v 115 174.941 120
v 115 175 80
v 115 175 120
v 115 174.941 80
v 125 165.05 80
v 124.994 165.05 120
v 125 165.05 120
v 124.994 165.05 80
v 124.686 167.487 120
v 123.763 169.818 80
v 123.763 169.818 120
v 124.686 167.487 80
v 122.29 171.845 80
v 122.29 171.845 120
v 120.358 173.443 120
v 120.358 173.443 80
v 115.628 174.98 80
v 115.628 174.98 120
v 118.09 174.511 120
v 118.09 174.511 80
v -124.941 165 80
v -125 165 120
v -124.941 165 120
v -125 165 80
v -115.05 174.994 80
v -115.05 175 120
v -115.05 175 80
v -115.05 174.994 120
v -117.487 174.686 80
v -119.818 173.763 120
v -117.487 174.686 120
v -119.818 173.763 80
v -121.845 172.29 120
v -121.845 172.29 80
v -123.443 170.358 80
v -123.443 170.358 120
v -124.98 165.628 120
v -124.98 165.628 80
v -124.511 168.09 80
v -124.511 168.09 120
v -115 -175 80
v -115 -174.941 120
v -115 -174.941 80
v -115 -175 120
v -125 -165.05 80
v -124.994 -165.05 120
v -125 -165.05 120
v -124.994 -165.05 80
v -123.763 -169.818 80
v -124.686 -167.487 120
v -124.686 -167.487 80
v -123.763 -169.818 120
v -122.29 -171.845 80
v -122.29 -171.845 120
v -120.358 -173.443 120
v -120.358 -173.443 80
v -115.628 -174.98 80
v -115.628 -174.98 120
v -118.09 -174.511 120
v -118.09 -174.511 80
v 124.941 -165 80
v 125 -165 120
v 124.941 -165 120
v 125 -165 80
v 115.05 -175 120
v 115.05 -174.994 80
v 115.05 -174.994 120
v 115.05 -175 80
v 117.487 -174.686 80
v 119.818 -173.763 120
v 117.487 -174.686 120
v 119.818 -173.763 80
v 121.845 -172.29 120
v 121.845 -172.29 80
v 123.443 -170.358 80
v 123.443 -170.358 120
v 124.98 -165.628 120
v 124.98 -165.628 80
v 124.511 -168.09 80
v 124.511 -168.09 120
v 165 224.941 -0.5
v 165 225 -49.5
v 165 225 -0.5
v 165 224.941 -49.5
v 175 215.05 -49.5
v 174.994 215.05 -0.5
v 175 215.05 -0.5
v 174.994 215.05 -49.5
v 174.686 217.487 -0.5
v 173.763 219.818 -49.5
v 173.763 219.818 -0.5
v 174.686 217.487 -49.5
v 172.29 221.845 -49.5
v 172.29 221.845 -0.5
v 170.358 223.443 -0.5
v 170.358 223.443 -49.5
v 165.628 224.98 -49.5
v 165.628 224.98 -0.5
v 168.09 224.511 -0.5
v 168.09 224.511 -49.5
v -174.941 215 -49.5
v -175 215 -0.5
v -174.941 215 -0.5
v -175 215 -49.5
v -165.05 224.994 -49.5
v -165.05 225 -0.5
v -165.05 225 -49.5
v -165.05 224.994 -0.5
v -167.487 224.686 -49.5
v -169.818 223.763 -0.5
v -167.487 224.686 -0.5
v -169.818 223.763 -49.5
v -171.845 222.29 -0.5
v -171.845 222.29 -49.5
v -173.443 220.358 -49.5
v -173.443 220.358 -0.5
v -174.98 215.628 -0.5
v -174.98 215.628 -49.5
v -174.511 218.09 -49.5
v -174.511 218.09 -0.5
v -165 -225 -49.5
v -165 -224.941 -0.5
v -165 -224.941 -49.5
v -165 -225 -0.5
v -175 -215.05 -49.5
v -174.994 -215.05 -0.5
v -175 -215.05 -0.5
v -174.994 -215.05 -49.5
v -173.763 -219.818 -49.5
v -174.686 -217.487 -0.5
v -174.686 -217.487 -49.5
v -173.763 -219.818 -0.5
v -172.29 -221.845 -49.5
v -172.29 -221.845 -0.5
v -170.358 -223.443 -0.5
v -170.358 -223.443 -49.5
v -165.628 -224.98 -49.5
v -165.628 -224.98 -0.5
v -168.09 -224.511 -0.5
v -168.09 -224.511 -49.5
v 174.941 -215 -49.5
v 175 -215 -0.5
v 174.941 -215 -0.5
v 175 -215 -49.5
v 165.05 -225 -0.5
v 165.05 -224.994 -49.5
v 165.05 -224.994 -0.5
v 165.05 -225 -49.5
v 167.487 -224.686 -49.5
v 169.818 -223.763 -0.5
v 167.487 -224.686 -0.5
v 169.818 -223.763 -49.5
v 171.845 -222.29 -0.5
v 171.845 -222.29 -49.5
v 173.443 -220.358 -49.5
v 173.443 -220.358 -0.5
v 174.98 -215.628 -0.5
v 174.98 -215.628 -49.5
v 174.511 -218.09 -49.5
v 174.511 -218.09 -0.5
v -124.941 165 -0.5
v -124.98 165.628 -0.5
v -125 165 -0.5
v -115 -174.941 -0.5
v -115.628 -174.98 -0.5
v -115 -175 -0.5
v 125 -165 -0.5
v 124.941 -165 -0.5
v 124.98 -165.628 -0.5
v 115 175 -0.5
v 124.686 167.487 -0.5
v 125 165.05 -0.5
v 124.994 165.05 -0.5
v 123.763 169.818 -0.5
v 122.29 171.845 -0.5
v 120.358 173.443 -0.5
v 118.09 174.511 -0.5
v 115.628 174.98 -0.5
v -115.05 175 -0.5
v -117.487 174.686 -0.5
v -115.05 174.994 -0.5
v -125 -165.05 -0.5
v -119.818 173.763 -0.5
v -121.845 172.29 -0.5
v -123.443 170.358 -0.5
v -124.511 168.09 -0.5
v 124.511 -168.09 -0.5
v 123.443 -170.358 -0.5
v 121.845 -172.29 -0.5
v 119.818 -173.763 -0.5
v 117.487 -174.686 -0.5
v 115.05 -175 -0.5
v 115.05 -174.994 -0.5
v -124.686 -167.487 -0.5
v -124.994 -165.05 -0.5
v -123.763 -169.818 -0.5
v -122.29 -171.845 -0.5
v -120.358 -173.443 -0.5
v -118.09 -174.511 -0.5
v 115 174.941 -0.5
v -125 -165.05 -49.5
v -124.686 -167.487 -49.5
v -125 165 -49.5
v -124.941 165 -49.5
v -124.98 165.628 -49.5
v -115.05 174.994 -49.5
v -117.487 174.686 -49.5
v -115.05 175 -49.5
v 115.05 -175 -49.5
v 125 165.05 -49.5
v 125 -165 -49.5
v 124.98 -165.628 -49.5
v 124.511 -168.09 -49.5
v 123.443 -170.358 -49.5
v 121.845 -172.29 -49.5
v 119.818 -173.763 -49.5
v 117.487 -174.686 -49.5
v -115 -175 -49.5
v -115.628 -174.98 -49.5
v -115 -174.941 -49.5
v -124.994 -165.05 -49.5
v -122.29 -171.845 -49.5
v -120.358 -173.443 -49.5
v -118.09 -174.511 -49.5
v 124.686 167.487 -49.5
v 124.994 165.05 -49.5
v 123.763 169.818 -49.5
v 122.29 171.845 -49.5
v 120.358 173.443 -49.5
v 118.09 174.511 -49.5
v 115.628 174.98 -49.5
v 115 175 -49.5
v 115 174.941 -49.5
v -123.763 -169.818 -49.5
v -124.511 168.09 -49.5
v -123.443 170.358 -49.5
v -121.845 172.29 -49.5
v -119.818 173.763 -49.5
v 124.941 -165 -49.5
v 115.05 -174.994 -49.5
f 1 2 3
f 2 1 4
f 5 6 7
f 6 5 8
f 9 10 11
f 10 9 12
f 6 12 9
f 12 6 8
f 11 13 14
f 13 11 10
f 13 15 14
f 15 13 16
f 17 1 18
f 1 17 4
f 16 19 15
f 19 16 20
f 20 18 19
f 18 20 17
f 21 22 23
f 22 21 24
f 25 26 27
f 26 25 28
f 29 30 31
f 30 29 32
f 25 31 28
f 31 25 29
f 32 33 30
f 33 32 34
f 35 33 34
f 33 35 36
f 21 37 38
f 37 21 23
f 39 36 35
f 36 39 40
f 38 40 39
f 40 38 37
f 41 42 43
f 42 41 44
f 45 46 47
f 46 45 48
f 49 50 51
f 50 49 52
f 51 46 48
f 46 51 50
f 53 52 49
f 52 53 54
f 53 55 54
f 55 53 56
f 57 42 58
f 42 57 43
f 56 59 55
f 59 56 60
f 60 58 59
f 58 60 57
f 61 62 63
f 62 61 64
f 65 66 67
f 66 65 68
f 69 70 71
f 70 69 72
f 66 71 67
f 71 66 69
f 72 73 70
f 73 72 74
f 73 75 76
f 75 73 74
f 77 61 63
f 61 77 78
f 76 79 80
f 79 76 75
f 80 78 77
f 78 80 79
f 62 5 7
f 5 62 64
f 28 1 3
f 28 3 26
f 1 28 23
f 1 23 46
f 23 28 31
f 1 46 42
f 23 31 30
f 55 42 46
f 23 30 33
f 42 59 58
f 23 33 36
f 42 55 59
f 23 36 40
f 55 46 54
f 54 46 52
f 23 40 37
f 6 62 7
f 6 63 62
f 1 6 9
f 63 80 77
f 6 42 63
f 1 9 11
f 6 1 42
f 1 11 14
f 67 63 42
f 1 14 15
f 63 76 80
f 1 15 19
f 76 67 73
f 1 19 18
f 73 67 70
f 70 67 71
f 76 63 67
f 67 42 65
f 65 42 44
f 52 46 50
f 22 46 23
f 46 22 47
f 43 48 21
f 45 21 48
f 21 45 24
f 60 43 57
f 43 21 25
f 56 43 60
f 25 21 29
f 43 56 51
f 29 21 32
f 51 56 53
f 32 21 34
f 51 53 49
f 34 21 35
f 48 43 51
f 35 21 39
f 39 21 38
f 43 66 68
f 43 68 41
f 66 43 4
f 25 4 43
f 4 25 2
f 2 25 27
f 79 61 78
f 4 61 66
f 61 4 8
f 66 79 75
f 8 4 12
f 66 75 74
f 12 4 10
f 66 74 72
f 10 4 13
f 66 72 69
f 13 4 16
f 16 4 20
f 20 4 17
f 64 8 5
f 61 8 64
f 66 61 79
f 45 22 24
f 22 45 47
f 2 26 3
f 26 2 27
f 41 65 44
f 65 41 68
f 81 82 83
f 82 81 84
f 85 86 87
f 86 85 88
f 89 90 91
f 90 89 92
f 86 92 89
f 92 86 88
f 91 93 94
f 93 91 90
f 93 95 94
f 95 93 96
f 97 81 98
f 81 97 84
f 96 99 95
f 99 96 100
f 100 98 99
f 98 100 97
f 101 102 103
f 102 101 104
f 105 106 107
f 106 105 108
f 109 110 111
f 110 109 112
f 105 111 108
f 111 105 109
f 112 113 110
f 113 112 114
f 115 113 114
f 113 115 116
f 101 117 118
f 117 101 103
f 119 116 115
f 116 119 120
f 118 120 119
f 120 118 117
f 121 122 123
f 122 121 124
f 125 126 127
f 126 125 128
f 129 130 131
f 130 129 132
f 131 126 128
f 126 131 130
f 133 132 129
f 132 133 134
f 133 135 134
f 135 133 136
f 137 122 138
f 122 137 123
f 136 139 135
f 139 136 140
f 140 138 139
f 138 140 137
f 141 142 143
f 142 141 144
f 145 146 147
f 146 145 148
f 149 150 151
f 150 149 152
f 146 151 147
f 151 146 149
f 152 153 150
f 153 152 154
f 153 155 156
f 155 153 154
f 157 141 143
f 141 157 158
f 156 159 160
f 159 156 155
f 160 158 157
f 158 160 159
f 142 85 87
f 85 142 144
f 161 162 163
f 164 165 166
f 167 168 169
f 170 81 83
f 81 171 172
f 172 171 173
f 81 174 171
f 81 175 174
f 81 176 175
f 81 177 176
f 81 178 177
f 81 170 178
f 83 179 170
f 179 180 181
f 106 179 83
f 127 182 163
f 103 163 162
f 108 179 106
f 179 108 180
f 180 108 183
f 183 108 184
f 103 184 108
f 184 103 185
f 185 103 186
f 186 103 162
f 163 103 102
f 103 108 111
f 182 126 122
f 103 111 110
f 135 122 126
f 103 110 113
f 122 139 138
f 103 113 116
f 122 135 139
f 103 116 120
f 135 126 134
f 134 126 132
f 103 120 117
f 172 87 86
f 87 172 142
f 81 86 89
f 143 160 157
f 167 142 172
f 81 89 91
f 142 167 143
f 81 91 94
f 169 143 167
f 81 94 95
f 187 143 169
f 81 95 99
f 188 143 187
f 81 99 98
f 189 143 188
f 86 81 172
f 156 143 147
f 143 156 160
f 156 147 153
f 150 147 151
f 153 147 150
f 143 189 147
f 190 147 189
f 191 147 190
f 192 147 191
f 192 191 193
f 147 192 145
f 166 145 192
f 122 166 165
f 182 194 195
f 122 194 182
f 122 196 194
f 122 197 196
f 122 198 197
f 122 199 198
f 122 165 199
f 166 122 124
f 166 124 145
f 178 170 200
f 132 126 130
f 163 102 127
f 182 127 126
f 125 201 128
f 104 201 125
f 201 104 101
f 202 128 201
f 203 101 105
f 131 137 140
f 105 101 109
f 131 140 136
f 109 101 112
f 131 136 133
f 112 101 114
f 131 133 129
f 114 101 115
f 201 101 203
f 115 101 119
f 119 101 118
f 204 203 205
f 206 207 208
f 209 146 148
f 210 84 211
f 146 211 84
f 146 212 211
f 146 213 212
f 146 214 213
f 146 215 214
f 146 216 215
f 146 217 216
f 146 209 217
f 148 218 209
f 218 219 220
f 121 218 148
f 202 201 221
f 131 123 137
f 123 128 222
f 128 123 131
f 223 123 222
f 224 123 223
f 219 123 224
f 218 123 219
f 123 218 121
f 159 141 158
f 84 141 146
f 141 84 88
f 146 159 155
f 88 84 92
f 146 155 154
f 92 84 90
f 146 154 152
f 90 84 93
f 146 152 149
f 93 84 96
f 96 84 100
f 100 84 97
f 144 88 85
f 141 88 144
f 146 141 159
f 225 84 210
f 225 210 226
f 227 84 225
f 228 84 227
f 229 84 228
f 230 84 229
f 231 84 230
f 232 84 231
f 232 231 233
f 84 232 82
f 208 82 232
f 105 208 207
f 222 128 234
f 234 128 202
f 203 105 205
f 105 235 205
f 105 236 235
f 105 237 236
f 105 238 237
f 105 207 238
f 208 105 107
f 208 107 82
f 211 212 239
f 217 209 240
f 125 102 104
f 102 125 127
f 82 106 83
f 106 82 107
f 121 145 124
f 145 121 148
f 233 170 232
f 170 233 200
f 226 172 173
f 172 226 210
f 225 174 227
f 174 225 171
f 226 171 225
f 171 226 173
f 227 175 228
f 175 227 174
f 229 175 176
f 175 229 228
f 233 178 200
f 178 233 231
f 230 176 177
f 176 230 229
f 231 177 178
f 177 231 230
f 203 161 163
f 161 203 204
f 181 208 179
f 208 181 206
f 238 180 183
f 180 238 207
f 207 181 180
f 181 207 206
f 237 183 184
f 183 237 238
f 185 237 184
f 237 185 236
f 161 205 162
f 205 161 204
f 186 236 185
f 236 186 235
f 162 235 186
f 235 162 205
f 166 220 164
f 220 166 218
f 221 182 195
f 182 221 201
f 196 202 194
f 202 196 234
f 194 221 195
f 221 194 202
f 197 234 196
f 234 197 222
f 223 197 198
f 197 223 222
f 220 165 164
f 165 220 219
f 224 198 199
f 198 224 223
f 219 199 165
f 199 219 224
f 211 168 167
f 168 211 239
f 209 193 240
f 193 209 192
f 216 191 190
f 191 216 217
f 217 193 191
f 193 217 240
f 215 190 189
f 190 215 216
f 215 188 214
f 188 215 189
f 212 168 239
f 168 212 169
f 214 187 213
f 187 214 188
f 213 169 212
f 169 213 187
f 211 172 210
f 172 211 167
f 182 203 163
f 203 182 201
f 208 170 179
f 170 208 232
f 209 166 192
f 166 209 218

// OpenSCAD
/*
http://codeviewer.org/view/code:1b36 
Copyright (C) 2011 Sergio Vilches
This program is free software: you can redistribute it and/or modify it under the terms of the GNU General Public License as published by the Free Software Foundation, either version 3 of the License, or (at your option) any later version.
This program is distributed in the hope that it will be useful, but WITHOUT ANY WARRANTY; without even the implied warranty of MERCHANTABILITY or FITNESS FOR A PARTICULAR PURPOSE. See the GNU General Public License for more details. You should have received a copy of the GNU General Public License along with this program. If not, see <http://www.gnu.org/licenses/>.
Contact: s.vilches.e@gmail.com


    ----------------------------------------------------------- 
                 Round Corners Cube (Extruded)                
      roundCornersCube(x,y,z,r) Where:                        
         - x = Xdir width                                     
         - y = Ydir width                                     
         - z = Height of the cube                             
         - r = Rounding radious                               
                                                              
      Example: roundCornerCube(10,10,2,1);                    
     *Some times it's needed to use F6 to see good results!   
 	 ----------------------------------------------------------- 
*/
// Test it!
punch();
#color("blue"){
 translate([-400,-400,0])
 square([2970,2100]);
}
matrice();

module punch() {
translate([0,0,100]) 
 roundCornersCube(250,350,40,10);
}



module matrice() {
translate([0,0,-25]) 
difference()
{
 roundCornersCube(350,450,49,10);
 roundCornersCube(250,350,50,10);
}
}

module createMeniscus(h,radius) // This module creates the shape that needs to be substracted from a cube to make its corners rounded.
difference(){        //This shape is basicly the difference between a quarter of cylinder and a cube
   translate([radius/2+0.1,radius/2+0.1,0]){
      cube([radius+0.2,radius+0.1,h+0.2],center=true);         // All that 0.x numbers are to avoid "ghost boundaries" when substracting
   }

   cylinder(h=h+0.2,r=radius,$fn = 25,center=true);
}


module roundCornersCube(x,y,z,r)  // Now we just substract the shape we have created in the four corners
difference(){
   cube([x,y,z], center=true);

translate([x/2-r,y/2-r]){  // We move to the first corner (x,y)
      rotate(0){  
         createMeniscus(z,r); // And substract the meniscus
      }
   }
   translate([-x/2+r,y/2-r]){ // To the second corner (-x,y)
      rotate(90){
         createMeniscus(z,r); // But this time we have to rotate the meniscus 90 deg
      }
   }
      translate([-x/2+r,-y/2+r]){ // ... 
      rotate(180){
         createMeniscus(z,r);
      }
   }
      translate([x/2-r,-y/2+r]){
      rotate(270){
         createMeniscus(z,r);
      }
   }
}
